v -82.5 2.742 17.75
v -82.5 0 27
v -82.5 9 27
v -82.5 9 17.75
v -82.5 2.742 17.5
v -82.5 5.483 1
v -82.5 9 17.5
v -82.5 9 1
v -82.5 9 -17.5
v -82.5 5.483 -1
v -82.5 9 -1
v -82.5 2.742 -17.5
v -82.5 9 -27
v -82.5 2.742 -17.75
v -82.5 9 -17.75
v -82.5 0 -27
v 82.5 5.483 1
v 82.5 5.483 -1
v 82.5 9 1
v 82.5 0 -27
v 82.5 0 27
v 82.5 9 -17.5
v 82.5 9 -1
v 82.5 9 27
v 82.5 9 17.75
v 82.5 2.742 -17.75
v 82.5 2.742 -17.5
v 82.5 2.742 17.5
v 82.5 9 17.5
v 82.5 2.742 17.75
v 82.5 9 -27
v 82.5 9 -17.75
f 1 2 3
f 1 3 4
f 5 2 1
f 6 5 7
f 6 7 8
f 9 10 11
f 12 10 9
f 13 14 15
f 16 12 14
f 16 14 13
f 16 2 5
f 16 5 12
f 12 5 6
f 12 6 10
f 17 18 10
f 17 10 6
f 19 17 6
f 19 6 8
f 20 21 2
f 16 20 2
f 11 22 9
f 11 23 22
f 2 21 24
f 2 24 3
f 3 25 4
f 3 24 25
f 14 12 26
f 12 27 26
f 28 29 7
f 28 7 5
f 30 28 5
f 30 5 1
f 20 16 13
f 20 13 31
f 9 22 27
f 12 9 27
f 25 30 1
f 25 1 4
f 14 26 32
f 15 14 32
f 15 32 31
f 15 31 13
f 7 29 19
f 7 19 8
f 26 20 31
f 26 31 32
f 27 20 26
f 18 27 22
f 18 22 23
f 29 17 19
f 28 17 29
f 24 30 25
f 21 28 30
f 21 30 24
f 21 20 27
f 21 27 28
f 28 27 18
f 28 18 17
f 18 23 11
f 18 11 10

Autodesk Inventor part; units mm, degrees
ref_plane "YZ Plane" through (0, 0, 0) normal (1, 0, 0) x (0, 1, 0)
ref_plane "XZ Plane" through (0, 0, 0) normal (0, 1, 0) x (-1, 0, 0)
ref_plane "XY Plane" through (0, 0, 0) normal (0, 0, 1) x (1, 0, 0)
sketch "Sketch1" plane through (0, 0, 0) normal (0, 1, 0) x (-1, 0, 0)
  line L0 (82.5, -27) -> (-82.5, -27)
  line L1 (-82.5, -27) -> (-82.5, 27)
  line L2 (-82.5, 27) -> (82.5, 27)
  line L3 (82.5, 27) -> (82.5, -27)
  line L4 (82.5, -27) -> (-82.5, 27) construction
  line L5 (-82.5, -27) -> (82.5, 27) construction
  point P0 (0, 0)
  dimension "d0" = 165
  dimension "d1" = 54
extrude "Extrusion1" add sketch "Sketch1" along normal blind 9
sketch "Sketch2" plane through (82.5, 0, 27) normal (1, 0, 0) x (0, 0, -1)
  line L0 (0, 9) -> (54, 9) projected
  line L1 (27, 0) -> (27, 9) construction
  line L2 (26, 12.517) -> (28, 12.517)
  line L3 (28, 12.517) -> (28, 5.483)
  line L4 (28, 5.483) -> (26, 5.483)
  line L5 (26, 5.483) -> (26, 12.517)
  line L6 (26, 12.517) -> (28, 5.483) construction
  line L7 (28, 12.517) -> (26, 5.483) construction
  dimension "d4" = 2
extrude "Extrusion2" cut sketch "Sketch2" against normal blind 203.725
sketch "Sketch3" plane through (82.5, 0, 27) normal (1, 0, 0) x (0, 0, -1)
  line L0 (27, 0) -> (27, 5.483) construction
  line L1 (28, 5.483) -> (26, 5.483) construction
  line L2 (27, 2.7415) -> (44.5, 2.7415) construction
  line L3 (44.5, 2.7415) -> (44.75, 2.7415)
  line L4 (44.75, 2.7415) -> (44.75, 10.8697)
  line L5 (44.75, 10.8697) -> (44.5, 10.8697)
  line L6 (44.5, 10.8697) -> (44.5, 2.7415)
  line L7 (9.5, 2.7415) -> (9.25, 2.7415)
  line L8 (9.25, 2.7415) -> (9.25, 10.8697)
  line L9 (9.25, 10.8697) -> (9.5, 10.8697)
  line L10 (9.5, 10.8697) -> (9.5, 2.7415)
  dimension "d7" = 17.5
  dimension "d8" = 0.25
extrude "Extrusion3" cut sketch "Sketch3" against normal blind 203.725
properties part number "Large Bread Board" material "PC/ABS Plastic"
